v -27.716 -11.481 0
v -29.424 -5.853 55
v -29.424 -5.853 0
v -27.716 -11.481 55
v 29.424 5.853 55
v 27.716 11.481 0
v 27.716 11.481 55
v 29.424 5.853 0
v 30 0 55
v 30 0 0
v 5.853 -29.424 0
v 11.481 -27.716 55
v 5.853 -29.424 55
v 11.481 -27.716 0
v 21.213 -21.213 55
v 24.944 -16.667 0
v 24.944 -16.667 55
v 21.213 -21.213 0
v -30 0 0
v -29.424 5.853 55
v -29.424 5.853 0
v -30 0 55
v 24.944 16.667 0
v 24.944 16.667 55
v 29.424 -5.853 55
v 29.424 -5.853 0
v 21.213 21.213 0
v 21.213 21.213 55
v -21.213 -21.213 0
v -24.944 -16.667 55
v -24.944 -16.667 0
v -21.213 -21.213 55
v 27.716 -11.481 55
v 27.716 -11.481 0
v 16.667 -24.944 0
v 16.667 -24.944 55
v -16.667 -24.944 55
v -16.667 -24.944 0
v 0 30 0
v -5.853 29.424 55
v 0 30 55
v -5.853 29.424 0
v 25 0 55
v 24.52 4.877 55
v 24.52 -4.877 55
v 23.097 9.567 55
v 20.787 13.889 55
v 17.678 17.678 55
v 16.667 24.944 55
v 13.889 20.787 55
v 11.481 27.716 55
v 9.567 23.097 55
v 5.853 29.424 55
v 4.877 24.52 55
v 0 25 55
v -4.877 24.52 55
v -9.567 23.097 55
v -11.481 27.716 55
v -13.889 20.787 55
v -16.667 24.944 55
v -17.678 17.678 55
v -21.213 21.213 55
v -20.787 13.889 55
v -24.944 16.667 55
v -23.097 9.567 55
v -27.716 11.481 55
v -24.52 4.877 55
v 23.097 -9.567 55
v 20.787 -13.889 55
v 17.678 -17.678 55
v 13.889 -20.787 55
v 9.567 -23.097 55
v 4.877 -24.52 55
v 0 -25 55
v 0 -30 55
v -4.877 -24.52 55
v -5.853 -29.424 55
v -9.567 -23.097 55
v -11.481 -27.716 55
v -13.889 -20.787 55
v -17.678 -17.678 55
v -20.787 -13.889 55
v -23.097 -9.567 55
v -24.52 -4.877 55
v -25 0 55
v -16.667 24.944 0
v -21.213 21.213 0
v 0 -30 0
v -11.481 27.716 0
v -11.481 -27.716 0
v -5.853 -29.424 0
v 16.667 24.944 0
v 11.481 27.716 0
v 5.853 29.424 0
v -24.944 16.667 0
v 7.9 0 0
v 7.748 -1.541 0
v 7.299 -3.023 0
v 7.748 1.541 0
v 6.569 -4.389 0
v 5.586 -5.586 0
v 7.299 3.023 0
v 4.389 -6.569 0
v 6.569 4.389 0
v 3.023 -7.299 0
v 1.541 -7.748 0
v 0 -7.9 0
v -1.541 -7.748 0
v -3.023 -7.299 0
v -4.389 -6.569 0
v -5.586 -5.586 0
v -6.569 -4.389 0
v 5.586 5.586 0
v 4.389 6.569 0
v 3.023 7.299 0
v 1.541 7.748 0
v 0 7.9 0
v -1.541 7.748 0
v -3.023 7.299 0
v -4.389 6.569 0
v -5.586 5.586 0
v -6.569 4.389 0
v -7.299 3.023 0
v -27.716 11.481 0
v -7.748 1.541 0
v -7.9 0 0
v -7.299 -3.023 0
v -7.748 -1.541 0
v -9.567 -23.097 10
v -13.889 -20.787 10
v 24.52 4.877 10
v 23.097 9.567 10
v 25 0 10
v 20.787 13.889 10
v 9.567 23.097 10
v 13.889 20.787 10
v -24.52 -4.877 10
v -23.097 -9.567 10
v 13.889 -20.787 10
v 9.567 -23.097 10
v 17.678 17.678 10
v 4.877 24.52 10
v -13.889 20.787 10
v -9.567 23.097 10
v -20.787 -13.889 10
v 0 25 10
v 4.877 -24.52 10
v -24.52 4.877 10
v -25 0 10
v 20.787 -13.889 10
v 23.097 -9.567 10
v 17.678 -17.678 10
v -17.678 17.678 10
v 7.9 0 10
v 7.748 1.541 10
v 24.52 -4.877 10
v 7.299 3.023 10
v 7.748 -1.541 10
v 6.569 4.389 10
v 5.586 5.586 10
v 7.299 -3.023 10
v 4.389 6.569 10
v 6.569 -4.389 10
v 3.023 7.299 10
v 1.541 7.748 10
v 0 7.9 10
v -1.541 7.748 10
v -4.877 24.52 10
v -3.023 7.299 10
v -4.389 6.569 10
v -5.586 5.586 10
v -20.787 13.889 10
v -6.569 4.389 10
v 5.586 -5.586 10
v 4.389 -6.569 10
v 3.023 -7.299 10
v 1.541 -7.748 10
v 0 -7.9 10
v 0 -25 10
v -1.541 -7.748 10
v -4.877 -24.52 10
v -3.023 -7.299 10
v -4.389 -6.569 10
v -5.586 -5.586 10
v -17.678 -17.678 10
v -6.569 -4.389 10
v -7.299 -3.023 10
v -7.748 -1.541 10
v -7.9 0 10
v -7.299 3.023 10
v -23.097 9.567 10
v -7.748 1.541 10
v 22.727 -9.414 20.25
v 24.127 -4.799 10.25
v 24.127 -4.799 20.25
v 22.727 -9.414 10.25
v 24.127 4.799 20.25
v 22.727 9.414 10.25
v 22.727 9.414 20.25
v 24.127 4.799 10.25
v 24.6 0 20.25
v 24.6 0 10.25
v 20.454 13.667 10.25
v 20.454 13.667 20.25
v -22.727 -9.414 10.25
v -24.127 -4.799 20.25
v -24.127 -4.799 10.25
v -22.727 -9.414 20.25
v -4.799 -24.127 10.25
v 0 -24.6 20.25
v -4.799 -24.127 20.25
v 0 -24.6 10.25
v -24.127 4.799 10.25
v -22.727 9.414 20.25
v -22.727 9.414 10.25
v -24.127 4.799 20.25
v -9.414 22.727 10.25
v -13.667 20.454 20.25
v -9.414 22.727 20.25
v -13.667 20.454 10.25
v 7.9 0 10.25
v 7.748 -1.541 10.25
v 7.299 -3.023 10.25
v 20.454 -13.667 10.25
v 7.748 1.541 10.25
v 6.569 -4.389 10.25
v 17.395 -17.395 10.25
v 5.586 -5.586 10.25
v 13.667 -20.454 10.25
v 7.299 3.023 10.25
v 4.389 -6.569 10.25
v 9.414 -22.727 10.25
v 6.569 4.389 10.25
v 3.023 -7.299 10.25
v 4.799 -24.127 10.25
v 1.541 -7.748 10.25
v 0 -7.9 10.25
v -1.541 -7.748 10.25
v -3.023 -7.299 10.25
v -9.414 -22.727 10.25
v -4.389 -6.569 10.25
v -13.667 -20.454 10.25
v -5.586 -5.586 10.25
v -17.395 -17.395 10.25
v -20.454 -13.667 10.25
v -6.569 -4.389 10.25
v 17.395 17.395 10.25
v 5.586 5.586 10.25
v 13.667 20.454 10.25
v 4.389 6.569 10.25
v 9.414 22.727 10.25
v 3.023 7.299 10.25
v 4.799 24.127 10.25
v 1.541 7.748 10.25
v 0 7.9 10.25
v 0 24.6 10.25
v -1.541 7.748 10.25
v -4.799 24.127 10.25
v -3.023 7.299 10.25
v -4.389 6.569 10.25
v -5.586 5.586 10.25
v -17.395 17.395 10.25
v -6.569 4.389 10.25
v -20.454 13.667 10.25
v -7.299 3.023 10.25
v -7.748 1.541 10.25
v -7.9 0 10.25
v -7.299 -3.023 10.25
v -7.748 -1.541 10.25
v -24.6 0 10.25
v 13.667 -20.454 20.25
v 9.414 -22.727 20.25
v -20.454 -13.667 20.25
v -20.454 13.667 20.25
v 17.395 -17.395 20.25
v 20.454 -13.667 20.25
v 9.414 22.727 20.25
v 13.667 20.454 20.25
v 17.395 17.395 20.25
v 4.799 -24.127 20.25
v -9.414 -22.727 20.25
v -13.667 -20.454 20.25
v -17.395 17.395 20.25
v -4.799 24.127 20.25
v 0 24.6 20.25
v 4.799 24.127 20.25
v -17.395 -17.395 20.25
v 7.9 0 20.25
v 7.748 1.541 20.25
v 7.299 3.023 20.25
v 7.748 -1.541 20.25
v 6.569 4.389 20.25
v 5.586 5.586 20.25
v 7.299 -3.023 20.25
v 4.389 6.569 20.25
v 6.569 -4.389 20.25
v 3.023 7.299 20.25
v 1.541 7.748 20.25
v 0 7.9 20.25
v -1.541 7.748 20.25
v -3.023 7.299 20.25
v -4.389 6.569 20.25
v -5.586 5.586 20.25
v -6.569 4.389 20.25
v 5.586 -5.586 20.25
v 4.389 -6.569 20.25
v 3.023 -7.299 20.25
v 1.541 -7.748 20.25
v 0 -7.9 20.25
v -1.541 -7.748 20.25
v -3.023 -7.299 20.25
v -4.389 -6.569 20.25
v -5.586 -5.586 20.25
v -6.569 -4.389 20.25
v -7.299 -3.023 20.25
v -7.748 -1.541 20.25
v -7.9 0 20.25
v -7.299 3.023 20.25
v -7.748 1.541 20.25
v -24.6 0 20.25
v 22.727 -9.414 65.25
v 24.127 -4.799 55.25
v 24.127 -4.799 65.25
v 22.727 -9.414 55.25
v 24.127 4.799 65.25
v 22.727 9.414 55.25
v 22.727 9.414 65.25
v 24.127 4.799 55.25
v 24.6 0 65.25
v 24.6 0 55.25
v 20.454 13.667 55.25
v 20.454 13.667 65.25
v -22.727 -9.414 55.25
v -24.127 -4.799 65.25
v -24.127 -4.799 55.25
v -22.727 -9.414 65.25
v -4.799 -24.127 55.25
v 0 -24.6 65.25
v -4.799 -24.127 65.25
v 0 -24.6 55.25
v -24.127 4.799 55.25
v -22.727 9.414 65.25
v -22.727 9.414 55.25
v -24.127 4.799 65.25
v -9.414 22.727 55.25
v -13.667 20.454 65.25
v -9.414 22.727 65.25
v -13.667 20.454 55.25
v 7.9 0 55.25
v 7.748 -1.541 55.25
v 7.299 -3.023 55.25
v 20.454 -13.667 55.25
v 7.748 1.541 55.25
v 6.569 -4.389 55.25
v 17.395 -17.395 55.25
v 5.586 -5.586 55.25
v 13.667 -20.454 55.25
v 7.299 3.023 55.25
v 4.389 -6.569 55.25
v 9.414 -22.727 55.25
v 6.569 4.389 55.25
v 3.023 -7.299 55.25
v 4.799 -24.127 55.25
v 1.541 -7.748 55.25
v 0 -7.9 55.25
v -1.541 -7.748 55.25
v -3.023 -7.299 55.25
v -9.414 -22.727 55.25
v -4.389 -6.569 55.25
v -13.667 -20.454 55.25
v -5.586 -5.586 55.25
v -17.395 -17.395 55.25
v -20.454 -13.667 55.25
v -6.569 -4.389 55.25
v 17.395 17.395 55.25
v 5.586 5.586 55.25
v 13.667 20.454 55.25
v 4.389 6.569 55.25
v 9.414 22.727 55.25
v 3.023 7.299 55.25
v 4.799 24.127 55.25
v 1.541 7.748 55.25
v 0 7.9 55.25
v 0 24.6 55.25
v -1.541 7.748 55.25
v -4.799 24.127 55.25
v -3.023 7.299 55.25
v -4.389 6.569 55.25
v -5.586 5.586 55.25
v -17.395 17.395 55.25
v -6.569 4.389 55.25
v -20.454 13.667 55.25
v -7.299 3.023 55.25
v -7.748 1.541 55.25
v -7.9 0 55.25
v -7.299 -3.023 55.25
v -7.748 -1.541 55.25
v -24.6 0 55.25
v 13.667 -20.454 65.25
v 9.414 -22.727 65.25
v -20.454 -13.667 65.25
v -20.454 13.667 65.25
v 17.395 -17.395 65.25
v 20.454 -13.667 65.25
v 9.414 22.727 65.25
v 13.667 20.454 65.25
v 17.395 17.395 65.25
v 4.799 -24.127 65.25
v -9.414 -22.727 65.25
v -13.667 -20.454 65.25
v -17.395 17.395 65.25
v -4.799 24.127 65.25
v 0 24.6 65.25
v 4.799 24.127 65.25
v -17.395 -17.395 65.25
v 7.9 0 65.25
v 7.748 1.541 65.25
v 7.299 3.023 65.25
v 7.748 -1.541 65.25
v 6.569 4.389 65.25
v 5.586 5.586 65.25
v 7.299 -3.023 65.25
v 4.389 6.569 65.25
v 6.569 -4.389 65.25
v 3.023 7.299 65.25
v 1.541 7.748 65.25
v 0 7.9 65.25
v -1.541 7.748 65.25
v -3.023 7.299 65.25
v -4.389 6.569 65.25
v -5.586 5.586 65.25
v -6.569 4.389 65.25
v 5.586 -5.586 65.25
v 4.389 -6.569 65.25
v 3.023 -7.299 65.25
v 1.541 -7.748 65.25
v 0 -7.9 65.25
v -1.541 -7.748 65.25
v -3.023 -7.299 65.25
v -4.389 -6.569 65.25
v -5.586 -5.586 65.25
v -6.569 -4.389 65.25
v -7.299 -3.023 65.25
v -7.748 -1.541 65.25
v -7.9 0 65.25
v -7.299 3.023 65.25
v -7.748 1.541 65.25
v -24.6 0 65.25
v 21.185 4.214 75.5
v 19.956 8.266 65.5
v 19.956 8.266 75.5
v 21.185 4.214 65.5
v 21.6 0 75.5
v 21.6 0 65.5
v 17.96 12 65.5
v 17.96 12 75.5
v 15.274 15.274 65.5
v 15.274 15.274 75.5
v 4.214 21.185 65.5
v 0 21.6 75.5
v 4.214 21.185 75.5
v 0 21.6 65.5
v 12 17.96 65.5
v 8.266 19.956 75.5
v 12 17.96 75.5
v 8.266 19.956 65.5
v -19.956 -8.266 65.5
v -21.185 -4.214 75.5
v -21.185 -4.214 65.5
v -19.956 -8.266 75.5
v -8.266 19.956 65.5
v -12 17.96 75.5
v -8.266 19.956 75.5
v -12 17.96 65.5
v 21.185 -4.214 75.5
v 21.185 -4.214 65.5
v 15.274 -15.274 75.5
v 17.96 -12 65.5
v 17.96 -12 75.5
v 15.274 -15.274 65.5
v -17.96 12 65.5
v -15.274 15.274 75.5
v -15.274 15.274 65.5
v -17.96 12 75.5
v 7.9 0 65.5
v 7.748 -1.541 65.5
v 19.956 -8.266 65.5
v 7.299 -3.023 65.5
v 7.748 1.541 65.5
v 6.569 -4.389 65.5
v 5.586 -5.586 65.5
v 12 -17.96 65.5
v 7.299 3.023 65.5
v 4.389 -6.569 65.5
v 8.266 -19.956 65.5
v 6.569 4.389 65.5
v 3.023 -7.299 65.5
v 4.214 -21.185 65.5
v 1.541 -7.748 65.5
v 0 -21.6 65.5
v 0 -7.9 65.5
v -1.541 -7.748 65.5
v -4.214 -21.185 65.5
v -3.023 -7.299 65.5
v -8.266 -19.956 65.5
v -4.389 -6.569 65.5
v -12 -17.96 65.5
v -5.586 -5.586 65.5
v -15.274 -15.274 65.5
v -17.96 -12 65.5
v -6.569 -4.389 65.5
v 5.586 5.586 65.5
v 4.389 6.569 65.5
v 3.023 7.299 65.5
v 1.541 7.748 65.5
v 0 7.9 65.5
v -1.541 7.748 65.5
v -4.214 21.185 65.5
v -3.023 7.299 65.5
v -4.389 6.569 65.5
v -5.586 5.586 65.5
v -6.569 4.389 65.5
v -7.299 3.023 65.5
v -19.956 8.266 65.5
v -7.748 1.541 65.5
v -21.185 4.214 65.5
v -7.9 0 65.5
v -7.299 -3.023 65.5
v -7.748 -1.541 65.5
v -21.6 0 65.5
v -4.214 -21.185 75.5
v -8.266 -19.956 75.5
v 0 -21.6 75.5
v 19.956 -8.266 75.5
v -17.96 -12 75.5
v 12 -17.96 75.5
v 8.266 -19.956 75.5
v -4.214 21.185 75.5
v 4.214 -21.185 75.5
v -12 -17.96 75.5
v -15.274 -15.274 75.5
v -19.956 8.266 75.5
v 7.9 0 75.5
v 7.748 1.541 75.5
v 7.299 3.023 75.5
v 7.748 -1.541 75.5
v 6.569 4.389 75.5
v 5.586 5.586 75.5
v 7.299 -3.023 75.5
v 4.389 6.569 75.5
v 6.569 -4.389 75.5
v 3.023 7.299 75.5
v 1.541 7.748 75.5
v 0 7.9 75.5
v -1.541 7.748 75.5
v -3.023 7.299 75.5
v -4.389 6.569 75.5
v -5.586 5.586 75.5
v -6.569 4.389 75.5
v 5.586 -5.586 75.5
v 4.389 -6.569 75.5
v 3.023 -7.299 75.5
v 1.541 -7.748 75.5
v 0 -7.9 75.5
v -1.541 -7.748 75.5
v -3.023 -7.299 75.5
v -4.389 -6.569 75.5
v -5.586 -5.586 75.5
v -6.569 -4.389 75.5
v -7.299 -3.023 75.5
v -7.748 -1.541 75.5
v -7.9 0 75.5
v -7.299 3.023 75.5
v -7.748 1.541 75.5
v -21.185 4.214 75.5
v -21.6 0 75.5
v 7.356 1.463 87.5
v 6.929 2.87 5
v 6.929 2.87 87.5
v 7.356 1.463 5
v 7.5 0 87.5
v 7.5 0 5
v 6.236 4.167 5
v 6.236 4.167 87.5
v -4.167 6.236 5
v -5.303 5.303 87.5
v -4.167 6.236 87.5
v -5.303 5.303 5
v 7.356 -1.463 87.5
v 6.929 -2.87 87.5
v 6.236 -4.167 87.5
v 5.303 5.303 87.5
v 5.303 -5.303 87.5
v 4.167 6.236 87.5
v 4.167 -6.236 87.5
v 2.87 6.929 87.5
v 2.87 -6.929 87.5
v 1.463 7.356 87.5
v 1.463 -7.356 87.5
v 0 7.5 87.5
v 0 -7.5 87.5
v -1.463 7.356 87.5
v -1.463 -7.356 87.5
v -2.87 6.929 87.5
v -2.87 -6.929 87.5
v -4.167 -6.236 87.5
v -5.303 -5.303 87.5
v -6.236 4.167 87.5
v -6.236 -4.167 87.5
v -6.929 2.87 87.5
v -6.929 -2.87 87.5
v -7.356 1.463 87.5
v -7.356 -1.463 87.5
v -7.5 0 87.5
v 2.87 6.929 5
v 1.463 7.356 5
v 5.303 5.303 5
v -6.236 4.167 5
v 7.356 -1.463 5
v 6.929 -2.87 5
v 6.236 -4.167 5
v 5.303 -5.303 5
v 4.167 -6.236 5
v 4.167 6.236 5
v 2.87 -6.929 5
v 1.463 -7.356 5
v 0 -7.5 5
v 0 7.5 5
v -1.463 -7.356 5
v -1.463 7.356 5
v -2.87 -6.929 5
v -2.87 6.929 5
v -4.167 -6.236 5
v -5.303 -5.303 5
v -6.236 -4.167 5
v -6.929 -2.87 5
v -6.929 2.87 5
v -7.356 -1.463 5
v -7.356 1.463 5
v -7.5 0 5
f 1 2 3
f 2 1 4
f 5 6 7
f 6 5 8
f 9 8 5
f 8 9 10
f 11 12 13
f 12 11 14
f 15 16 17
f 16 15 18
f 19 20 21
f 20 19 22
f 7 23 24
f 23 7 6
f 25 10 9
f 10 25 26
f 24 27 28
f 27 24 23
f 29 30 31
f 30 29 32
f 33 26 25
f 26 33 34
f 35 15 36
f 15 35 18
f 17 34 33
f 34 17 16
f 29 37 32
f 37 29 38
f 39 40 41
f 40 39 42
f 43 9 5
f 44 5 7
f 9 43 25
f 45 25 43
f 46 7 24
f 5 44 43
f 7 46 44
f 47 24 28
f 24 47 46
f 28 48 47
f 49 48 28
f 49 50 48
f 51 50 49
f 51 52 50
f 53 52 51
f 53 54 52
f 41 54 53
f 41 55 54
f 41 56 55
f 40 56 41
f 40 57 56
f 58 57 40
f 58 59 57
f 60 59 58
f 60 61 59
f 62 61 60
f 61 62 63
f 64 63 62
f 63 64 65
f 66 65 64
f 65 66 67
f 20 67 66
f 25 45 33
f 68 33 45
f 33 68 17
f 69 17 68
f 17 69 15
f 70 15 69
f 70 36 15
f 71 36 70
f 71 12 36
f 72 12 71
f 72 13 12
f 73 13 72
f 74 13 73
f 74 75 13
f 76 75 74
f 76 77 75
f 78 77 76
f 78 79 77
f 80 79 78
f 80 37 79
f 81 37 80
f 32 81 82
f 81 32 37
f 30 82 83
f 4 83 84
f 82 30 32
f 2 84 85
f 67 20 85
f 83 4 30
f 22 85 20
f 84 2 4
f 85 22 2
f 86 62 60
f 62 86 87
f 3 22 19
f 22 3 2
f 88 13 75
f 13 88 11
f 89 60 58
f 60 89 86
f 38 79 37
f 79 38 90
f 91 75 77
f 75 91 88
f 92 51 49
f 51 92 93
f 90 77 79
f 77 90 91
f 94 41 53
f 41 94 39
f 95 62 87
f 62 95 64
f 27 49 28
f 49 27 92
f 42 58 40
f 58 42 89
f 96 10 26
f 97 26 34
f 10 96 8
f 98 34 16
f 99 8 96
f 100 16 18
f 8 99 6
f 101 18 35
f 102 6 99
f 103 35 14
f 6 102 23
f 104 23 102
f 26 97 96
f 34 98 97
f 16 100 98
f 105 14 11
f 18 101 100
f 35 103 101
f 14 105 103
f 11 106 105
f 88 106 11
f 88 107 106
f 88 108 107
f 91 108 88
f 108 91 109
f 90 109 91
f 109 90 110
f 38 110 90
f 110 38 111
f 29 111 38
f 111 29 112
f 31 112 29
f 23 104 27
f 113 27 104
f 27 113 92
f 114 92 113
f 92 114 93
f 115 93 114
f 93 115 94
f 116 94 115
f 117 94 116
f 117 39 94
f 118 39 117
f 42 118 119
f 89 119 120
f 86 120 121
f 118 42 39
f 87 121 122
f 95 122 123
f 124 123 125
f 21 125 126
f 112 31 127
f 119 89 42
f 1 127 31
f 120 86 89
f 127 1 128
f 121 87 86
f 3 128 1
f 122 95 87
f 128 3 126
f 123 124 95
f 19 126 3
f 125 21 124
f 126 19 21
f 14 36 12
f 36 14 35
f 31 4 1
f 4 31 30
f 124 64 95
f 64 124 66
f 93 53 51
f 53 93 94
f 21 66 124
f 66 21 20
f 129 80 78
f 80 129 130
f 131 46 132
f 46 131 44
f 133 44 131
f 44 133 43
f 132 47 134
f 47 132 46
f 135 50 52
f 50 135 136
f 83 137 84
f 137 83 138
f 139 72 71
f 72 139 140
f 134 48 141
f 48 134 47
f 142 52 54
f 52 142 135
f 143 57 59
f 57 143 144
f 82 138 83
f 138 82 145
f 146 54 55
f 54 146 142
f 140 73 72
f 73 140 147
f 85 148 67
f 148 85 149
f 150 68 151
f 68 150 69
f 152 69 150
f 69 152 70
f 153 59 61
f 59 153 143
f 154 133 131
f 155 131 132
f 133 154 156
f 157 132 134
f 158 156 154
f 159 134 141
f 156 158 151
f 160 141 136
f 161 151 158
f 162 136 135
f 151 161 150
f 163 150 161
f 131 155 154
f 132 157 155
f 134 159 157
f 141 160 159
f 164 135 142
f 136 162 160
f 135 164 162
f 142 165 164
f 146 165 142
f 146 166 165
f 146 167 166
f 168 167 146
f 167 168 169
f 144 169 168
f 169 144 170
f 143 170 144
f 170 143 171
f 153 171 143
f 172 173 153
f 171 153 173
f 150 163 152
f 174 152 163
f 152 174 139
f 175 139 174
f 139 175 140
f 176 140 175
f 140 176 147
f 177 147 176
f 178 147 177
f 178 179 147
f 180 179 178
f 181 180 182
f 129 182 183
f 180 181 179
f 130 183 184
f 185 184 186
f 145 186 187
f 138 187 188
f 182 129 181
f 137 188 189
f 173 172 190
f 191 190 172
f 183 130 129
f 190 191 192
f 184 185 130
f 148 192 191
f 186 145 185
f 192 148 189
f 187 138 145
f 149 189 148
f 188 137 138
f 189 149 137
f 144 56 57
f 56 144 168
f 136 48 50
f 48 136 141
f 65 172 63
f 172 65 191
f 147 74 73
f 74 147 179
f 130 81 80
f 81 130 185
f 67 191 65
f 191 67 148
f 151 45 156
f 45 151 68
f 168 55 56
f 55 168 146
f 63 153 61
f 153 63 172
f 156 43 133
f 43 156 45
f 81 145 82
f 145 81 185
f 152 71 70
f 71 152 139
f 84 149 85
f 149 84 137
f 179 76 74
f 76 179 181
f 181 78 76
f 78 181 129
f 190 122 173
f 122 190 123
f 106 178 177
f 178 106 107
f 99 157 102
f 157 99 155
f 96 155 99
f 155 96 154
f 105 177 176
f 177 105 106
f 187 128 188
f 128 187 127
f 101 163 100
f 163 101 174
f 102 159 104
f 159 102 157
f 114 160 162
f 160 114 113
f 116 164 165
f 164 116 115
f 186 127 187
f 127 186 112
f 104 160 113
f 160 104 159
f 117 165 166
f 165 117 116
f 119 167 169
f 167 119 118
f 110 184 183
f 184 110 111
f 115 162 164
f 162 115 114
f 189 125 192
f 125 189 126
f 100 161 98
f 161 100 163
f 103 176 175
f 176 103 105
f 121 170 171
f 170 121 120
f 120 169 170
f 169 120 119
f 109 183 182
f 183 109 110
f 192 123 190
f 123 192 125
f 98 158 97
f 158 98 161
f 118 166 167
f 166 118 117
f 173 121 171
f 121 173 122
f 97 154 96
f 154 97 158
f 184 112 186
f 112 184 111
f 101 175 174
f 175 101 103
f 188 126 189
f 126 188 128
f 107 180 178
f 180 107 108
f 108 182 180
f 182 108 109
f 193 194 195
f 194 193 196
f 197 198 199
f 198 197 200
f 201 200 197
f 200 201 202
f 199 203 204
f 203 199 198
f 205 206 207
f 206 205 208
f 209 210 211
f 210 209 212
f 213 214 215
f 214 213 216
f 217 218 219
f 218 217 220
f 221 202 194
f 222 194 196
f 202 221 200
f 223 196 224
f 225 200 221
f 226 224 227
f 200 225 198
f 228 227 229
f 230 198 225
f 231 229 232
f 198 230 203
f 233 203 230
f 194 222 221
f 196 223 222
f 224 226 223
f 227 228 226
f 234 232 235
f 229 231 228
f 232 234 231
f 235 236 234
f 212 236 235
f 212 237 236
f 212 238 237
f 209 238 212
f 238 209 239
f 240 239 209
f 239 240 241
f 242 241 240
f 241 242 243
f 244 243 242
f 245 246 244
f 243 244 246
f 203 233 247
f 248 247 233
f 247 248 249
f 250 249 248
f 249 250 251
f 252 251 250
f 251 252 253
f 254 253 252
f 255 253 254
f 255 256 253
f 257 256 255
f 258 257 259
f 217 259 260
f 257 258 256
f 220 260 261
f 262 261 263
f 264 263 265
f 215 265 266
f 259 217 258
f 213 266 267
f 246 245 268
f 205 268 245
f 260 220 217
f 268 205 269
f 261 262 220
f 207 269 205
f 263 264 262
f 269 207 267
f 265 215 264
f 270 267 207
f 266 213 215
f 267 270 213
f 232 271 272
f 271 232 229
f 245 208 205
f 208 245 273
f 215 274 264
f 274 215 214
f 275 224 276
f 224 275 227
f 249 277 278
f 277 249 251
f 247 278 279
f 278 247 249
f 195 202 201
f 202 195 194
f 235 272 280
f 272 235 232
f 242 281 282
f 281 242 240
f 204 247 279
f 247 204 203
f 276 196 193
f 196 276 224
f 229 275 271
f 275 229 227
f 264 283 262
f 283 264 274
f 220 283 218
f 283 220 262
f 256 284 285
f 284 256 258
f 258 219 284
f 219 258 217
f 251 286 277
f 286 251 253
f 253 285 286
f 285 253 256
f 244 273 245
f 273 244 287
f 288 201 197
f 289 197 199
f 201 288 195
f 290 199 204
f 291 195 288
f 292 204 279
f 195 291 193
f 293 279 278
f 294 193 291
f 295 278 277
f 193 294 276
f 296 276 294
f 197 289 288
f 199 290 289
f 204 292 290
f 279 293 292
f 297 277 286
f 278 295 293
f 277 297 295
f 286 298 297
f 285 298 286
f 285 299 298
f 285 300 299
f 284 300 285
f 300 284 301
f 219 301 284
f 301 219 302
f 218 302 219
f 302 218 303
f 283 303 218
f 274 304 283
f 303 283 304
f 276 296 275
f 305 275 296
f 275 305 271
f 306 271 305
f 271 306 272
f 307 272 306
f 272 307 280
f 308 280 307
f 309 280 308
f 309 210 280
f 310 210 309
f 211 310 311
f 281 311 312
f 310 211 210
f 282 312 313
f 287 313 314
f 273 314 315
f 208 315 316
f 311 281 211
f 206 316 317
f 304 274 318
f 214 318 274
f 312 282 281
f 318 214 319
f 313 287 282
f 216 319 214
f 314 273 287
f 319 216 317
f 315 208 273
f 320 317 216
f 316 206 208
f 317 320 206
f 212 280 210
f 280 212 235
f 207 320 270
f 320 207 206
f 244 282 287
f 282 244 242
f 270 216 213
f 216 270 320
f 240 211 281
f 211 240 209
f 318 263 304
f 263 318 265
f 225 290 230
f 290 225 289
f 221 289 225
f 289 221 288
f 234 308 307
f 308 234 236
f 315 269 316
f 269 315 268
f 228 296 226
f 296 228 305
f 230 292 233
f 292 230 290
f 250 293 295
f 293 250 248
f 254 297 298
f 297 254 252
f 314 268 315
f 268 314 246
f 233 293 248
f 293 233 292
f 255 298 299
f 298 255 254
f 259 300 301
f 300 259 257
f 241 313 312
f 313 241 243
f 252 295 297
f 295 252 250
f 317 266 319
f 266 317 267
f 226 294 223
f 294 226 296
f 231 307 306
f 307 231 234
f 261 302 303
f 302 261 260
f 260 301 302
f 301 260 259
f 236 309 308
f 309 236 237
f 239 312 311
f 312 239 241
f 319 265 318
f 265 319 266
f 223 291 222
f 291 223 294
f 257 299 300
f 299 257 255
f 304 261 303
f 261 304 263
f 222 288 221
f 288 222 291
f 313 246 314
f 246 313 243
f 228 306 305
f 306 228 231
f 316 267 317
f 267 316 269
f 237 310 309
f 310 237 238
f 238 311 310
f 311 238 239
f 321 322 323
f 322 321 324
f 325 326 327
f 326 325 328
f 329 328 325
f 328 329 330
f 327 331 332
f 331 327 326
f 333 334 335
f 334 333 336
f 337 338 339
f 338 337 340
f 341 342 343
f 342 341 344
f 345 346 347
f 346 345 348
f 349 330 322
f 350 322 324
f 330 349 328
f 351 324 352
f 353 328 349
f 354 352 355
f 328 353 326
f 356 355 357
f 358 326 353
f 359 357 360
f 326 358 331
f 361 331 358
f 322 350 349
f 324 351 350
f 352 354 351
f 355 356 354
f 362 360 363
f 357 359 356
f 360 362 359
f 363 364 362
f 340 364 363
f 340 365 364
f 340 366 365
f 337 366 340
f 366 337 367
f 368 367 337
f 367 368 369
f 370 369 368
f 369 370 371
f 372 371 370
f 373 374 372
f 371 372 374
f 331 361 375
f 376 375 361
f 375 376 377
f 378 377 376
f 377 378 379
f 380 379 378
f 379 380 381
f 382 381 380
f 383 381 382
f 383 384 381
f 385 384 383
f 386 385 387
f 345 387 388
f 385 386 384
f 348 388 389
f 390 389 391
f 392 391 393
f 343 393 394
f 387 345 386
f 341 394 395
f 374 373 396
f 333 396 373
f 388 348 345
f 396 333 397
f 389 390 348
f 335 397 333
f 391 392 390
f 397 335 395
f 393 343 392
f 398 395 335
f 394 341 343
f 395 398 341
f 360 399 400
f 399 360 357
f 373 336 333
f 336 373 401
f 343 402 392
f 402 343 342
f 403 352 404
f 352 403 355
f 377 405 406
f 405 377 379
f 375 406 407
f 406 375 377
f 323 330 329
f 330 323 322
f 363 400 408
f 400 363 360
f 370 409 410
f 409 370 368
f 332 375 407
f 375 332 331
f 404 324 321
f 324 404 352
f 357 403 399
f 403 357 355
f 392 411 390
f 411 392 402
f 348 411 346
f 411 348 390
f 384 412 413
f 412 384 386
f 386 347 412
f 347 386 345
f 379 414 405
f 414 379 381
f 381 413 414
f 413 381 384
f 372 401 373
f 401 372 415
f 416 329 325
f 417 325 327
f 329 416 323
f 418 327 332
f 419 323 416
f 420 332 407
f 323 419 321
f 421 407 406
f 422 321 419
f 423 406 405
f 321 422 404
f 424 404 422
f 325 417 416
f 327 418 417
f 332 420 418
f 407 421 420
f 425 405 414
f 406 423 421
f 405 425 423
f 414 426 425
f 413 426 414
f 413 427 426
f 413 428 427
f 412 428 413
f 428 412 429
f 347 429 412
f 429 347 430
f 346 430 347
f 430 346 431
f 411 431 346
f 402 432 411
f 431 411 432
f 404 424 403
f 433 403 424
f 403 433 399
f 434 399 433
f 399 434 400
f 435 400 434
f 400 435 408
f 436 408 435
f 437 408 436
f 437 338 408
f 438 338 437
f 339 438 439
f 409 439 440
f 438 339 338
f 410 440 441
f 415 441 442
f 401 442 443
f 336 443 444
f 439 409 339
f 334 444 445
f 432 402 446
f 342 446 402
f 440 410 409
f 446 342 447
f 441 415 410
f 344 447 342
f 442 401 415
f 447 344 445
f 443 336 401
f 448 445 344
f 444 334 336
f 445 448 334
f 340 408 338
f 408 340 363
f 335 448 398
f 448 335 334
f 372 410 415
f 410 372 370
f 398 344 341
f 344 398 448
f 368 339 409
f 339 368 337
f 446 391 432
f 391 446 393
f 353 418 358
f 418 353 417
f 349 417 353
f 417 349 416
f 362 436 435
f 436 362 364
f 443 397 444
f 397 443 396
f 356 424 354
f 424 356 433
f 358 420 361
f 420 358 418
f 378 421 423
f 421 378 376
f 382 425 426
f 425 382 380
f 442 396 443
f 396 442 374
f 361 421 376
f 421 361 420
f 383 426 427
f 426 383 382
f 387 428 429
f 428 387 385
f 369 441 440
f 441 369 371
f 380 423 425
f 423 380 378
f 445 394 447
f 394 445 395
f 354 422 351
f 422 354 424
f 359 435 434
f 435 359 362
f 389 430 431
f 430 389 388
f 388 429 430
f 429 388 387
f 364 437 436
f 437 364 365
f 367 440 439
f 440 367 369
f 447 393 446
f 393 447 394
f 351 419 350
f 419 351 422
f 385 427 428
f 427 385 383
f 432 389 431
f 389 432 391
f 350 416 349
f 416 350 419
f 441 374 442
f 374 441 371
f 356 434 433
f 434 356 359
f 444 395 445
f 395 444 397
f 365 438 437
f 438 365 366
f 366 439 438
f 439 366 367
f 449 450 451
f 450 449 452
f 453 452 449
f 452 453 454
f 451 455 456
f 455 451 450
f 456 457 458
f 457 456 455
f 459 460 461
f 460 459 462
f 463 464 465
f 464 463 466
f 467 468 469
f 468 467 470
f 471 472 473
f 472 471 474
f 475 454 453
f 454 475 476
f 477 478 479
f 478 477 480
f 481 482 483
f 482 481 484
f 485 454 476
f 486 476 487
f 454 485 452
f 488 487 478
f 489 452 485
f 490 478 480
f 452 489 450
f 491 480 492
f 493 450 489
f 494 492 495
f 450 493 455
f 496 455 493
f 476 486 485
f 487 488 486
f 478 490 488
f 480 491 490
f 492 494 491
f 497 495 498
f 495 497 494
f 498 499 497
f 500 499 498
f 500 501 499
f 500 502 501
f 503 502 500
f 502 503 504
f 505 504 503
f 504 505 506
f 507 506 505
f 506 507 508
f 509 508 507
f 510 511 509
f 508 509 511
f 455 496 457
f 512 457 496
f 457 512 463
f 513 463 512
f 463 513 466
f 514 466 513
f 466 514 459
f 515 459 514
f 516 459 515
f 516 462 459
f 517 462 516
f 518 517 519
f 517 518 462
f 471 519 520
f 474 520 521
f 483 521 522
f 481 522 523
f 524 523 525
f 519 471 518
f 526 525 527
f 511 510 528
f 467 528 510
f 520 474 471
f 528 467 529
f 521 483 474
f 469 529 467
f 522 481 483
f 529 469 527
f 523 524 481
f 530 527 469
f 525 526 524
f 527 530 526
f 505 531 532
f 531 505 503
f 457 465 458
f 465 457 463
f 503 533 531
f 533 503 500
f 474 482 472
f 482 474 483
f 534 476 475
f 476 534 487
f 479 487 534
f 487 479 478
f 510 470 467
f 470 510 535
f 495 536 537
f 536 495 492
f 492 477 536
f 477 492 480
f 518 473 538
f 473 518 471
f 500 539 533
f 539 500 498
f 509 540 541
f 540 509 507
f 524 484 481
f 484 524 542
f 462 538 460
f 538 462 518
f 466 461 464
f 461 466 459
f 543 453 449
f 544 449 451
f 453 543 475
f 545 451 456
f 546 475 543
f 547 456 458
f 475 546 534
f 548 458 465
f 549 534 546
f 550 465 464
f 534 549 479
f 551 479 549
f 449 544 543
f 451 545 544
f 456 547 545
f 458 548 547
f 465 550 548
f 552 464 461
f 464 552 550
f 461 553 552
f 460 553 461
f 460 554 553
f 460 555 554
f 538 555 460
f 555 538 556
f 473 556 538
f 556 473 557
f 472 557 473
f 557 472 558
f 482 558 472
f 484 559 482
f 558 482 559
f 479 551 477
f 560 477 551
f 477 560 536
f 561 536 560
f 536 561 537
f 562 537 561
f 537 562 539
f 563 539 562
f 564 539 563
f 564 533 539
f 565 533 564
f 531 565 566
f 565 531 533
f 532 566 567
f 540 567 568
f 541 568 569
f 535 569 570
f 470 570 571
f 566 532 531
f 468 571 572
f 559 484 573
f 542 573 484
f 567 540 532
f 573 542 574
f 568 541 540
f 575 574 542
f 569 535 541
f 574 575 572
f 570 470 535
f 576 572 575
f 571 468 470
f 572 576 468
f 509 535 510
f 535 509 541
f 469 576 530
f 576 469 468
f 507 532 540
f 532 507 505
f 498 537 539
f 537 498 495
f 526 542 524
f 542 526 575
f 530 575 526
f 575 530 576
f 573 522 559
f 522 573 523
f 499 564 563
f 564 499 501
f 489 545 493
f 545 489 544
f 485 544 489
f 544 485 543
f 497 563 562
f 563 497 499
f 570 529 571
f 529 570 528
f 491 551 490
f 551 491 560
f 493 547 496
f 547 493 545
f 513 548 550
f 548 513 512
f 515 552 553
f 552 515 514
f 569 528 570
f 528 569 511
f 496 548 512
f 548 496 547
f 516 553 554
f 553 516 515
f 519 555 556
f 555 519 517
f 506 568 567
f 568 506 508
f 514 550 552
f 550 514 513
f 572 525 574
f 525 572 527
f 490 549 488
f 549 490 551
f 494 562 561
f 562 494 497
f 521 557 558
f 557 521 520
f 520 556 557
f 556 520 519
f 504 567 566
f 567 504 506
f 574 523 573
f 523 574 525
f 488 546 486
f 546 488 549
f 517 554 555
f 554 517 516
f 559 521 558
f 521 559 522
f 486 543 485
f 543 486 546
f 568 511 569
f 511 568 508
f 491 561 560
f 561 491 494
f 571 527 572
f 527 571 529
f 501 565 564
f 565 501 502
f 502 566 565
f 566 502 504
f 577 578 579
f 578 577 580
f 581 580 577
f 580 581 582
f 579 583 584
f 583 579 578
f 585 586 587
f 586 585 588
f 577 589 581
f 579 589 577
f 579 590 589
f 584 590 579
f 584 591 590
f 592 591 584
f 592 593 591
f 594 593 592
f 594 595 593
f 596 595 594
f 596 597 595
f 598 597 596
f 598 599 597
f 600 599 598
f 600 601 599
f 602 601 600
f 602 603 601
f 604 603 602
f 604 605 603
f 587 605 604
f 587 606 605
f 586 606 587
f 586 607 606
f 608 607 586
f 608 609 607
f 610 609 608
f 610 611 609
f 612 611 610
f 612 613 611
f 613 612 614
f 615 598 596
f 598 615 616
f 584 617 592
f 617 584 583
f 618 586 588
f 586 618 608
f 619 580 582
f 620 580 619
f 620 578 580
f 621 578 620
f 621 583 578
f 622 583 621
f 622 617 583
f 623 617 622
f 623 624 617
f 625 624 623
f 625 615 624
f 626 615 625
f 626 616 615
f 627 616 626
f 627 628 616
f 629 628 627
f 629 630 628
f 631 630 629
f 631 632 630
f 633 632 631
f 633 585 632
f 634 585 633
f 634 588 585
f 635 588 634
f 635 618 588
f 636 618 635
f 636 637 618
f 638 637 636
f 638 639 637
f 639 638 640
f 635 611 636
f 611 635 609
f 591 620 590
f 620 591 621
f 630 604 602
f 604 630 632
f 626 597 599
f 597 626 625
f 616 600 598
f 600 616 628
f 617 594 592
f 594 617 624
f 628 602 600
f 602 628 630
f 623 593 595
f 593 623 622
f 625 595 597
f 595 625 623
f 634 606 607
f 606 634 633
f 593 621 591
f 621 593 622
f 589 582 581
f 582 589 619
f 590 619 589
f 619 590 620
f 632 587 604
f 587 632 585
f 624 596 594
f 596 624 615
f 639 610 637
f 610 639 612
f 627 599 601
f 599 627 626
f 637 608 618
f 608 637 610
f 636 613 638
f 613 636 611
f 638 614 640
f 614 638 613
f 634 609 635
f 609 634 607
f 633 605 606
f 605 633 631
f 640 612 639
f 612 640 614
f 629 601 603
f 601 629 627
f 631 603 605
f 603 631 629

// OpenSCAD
$fn = 32;

// ------------------------------------------------------------------------
// Bearing housing: housing d60, two bearings and a shaft
// Every part is its own module, assembly() places them once.
// ------------------------------------------------------------------------

// --- part 1 ---
module housing() {
  difference() {
    cylinder(h = 55, d = 60);
    translate([0, 0, 10]) cylinder(h = 46, d = 50);
    translate([0, 0, -1]) cylinder(h = 12, d = 15.8);
  }
}

// --- part 2 ---
module bearing_lower() {
  difference() {
      translate([0, 0, 0]) cylinder(h = 10, d = 49.2);
      translate([0, 0, -1]) cylinder(h = 12, d = 15.8);
    }
}

// --- part 3 ---
module bearing_upper() {
  difference() {
      translate([0, 0, 0]) cylinder(h = 10, d = 49.2);
      translate([0, 0, -1]) cylinder(h = 12, d = 15.8);
    }
}

// --- part 4 ---
module spacer() {
  difference() {
      translate([0, 0, 0]) cylinder(h = 10, d = 43.2);
      translate([0, 0, -1]) cylinder(h = 12, d = 15.8);
    }
}

// --- part 5 ---
module shaft() {
  translate([0, 0, -41.25]) cylinder(h = 82.5, d = 15);
}

// --- assembly ---
module assembly() {
  translate([0, 0, 0]) rotate([0, 0, 0]) housing();
  translate([0, 0, 10.25]) rotate([0, 0, 0]) bearing_lower();
  translate([0, 0, 55.25]) rotate([0, 0, 0]) bearing_upper();
  translate([0, 0, 65.5]) rotate([0, 0, 0]) spacer();
  translate([0, 0, 46.25]) rotate([0, 0, 0]) shaft();
}

assembly();
